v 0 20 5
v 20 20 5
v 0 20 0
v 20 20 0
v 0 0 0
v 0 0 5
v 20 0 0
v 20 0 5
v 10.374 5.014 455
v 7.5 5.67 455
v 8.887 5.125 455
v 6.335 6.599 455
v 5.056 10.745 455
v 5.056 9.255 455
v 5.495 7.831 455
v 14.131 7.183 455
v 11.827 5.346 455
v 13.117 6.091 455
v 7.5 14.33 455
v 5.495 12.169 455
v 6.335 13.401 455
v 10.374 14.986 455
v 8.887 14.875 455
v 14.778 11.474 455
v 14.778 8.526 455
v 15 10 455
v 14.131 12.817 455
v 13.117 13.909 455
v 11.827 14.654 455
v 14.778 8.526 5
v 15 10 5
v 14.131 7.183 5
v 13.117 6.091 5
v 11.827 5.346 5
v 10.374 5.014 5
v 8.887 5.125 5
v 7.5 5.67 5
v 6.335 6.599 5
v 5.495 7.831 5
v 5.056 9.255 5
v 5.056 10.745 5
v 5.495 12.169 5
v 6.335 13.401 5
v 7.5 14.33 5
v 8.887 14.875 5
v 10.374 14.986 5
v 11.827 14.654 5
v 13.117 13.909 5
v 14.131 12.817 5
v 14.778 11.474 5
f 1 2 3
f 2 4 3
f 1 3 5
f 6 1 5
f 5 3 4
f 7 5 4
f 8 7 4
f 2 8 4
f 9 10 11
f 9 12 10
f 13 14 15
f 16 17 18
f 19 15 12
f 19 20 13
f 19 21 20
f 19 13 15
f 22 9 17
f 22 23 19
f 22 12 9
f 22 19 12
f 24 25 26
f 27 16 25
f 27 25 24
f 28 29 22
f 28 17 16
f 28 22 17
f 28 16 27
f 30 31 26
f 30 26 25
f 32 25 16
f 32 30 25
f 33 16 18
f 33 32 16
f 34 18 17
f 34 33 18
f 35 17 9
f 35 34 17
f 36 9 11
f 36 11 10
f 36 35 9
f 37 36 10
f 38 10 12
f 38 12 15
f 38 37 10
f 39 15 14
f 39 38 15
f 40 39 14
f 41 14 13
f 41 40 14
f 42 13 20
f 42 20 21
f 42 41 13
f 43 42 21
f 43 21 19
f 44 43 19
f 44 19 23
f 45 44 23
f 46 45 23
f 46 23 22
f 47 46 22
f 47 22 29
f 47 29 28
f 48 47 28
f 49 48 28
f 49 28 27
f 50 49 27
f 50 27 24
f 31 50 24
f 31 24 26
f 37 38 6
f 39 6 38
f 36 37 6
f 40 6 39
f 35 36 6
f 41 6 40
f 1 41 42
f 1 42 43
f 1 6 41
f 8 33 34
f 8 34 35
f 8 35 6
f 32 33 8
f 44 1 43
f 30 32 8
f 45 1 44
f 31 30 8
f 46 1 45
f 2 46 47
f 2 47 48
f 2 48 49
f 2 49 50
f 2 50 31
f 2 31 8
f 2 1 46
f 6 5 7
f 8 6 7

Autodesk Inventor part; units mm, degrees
ref_plane "YZ Plane" through (0, 0, 0) normal (1, 0, 0) x (0, 1, 0)
ref_plane "XZ Plane" through (0, 0, 0) normal (0, 1, 0) x (-1, 0, 0)
ref_plane "XY Plane" through (0, 0, 0) normal (0, 0, 1) x (1, 0, 0)
sketch "Sketch1" plane through (0, 0, 0) normal (0, 0, 1) x (1, 0, 0)
  line L0 (0, 0) -> (20, 0)
  line L1 (20, 0) -> (20, 20)
  line L2 (20, 20) -> (0, 20)
  line L3 (0, 20) -> (0, 0)
  dimension "d2" = 20
  dimension "d3" = 20
extrude "Extrusion1" add sketch "Sketch1" along normal blind 5
sketch "Sketch2" plane through (0, 0, 5) normal (0, 0, 1) x (1, 0, 0)
  point P0 (0, 0)
sketch "Sketch3" plane through (0, 0, 5) normal (0, 0, 1) x (1, 0, 0)
  line L0 (0, 0) -> (10, 0)
  line L1 (0, 0) -> (20, 0) projected
  line L2 (10, 0) -> (10, 10)
  circle A0 centre (10, 10) radius 5
  dimension "d6" = 10
  dimension "d7" = 10
  dimension "d8" = 10
extrude "Extrusion2" add sketch "Sketch3" along normal blind 450
thread "Thread1" size "M10x1.5" class "6g" standard "ANSI Metric M Profile" full length
properties part number "bolt for capping system"
